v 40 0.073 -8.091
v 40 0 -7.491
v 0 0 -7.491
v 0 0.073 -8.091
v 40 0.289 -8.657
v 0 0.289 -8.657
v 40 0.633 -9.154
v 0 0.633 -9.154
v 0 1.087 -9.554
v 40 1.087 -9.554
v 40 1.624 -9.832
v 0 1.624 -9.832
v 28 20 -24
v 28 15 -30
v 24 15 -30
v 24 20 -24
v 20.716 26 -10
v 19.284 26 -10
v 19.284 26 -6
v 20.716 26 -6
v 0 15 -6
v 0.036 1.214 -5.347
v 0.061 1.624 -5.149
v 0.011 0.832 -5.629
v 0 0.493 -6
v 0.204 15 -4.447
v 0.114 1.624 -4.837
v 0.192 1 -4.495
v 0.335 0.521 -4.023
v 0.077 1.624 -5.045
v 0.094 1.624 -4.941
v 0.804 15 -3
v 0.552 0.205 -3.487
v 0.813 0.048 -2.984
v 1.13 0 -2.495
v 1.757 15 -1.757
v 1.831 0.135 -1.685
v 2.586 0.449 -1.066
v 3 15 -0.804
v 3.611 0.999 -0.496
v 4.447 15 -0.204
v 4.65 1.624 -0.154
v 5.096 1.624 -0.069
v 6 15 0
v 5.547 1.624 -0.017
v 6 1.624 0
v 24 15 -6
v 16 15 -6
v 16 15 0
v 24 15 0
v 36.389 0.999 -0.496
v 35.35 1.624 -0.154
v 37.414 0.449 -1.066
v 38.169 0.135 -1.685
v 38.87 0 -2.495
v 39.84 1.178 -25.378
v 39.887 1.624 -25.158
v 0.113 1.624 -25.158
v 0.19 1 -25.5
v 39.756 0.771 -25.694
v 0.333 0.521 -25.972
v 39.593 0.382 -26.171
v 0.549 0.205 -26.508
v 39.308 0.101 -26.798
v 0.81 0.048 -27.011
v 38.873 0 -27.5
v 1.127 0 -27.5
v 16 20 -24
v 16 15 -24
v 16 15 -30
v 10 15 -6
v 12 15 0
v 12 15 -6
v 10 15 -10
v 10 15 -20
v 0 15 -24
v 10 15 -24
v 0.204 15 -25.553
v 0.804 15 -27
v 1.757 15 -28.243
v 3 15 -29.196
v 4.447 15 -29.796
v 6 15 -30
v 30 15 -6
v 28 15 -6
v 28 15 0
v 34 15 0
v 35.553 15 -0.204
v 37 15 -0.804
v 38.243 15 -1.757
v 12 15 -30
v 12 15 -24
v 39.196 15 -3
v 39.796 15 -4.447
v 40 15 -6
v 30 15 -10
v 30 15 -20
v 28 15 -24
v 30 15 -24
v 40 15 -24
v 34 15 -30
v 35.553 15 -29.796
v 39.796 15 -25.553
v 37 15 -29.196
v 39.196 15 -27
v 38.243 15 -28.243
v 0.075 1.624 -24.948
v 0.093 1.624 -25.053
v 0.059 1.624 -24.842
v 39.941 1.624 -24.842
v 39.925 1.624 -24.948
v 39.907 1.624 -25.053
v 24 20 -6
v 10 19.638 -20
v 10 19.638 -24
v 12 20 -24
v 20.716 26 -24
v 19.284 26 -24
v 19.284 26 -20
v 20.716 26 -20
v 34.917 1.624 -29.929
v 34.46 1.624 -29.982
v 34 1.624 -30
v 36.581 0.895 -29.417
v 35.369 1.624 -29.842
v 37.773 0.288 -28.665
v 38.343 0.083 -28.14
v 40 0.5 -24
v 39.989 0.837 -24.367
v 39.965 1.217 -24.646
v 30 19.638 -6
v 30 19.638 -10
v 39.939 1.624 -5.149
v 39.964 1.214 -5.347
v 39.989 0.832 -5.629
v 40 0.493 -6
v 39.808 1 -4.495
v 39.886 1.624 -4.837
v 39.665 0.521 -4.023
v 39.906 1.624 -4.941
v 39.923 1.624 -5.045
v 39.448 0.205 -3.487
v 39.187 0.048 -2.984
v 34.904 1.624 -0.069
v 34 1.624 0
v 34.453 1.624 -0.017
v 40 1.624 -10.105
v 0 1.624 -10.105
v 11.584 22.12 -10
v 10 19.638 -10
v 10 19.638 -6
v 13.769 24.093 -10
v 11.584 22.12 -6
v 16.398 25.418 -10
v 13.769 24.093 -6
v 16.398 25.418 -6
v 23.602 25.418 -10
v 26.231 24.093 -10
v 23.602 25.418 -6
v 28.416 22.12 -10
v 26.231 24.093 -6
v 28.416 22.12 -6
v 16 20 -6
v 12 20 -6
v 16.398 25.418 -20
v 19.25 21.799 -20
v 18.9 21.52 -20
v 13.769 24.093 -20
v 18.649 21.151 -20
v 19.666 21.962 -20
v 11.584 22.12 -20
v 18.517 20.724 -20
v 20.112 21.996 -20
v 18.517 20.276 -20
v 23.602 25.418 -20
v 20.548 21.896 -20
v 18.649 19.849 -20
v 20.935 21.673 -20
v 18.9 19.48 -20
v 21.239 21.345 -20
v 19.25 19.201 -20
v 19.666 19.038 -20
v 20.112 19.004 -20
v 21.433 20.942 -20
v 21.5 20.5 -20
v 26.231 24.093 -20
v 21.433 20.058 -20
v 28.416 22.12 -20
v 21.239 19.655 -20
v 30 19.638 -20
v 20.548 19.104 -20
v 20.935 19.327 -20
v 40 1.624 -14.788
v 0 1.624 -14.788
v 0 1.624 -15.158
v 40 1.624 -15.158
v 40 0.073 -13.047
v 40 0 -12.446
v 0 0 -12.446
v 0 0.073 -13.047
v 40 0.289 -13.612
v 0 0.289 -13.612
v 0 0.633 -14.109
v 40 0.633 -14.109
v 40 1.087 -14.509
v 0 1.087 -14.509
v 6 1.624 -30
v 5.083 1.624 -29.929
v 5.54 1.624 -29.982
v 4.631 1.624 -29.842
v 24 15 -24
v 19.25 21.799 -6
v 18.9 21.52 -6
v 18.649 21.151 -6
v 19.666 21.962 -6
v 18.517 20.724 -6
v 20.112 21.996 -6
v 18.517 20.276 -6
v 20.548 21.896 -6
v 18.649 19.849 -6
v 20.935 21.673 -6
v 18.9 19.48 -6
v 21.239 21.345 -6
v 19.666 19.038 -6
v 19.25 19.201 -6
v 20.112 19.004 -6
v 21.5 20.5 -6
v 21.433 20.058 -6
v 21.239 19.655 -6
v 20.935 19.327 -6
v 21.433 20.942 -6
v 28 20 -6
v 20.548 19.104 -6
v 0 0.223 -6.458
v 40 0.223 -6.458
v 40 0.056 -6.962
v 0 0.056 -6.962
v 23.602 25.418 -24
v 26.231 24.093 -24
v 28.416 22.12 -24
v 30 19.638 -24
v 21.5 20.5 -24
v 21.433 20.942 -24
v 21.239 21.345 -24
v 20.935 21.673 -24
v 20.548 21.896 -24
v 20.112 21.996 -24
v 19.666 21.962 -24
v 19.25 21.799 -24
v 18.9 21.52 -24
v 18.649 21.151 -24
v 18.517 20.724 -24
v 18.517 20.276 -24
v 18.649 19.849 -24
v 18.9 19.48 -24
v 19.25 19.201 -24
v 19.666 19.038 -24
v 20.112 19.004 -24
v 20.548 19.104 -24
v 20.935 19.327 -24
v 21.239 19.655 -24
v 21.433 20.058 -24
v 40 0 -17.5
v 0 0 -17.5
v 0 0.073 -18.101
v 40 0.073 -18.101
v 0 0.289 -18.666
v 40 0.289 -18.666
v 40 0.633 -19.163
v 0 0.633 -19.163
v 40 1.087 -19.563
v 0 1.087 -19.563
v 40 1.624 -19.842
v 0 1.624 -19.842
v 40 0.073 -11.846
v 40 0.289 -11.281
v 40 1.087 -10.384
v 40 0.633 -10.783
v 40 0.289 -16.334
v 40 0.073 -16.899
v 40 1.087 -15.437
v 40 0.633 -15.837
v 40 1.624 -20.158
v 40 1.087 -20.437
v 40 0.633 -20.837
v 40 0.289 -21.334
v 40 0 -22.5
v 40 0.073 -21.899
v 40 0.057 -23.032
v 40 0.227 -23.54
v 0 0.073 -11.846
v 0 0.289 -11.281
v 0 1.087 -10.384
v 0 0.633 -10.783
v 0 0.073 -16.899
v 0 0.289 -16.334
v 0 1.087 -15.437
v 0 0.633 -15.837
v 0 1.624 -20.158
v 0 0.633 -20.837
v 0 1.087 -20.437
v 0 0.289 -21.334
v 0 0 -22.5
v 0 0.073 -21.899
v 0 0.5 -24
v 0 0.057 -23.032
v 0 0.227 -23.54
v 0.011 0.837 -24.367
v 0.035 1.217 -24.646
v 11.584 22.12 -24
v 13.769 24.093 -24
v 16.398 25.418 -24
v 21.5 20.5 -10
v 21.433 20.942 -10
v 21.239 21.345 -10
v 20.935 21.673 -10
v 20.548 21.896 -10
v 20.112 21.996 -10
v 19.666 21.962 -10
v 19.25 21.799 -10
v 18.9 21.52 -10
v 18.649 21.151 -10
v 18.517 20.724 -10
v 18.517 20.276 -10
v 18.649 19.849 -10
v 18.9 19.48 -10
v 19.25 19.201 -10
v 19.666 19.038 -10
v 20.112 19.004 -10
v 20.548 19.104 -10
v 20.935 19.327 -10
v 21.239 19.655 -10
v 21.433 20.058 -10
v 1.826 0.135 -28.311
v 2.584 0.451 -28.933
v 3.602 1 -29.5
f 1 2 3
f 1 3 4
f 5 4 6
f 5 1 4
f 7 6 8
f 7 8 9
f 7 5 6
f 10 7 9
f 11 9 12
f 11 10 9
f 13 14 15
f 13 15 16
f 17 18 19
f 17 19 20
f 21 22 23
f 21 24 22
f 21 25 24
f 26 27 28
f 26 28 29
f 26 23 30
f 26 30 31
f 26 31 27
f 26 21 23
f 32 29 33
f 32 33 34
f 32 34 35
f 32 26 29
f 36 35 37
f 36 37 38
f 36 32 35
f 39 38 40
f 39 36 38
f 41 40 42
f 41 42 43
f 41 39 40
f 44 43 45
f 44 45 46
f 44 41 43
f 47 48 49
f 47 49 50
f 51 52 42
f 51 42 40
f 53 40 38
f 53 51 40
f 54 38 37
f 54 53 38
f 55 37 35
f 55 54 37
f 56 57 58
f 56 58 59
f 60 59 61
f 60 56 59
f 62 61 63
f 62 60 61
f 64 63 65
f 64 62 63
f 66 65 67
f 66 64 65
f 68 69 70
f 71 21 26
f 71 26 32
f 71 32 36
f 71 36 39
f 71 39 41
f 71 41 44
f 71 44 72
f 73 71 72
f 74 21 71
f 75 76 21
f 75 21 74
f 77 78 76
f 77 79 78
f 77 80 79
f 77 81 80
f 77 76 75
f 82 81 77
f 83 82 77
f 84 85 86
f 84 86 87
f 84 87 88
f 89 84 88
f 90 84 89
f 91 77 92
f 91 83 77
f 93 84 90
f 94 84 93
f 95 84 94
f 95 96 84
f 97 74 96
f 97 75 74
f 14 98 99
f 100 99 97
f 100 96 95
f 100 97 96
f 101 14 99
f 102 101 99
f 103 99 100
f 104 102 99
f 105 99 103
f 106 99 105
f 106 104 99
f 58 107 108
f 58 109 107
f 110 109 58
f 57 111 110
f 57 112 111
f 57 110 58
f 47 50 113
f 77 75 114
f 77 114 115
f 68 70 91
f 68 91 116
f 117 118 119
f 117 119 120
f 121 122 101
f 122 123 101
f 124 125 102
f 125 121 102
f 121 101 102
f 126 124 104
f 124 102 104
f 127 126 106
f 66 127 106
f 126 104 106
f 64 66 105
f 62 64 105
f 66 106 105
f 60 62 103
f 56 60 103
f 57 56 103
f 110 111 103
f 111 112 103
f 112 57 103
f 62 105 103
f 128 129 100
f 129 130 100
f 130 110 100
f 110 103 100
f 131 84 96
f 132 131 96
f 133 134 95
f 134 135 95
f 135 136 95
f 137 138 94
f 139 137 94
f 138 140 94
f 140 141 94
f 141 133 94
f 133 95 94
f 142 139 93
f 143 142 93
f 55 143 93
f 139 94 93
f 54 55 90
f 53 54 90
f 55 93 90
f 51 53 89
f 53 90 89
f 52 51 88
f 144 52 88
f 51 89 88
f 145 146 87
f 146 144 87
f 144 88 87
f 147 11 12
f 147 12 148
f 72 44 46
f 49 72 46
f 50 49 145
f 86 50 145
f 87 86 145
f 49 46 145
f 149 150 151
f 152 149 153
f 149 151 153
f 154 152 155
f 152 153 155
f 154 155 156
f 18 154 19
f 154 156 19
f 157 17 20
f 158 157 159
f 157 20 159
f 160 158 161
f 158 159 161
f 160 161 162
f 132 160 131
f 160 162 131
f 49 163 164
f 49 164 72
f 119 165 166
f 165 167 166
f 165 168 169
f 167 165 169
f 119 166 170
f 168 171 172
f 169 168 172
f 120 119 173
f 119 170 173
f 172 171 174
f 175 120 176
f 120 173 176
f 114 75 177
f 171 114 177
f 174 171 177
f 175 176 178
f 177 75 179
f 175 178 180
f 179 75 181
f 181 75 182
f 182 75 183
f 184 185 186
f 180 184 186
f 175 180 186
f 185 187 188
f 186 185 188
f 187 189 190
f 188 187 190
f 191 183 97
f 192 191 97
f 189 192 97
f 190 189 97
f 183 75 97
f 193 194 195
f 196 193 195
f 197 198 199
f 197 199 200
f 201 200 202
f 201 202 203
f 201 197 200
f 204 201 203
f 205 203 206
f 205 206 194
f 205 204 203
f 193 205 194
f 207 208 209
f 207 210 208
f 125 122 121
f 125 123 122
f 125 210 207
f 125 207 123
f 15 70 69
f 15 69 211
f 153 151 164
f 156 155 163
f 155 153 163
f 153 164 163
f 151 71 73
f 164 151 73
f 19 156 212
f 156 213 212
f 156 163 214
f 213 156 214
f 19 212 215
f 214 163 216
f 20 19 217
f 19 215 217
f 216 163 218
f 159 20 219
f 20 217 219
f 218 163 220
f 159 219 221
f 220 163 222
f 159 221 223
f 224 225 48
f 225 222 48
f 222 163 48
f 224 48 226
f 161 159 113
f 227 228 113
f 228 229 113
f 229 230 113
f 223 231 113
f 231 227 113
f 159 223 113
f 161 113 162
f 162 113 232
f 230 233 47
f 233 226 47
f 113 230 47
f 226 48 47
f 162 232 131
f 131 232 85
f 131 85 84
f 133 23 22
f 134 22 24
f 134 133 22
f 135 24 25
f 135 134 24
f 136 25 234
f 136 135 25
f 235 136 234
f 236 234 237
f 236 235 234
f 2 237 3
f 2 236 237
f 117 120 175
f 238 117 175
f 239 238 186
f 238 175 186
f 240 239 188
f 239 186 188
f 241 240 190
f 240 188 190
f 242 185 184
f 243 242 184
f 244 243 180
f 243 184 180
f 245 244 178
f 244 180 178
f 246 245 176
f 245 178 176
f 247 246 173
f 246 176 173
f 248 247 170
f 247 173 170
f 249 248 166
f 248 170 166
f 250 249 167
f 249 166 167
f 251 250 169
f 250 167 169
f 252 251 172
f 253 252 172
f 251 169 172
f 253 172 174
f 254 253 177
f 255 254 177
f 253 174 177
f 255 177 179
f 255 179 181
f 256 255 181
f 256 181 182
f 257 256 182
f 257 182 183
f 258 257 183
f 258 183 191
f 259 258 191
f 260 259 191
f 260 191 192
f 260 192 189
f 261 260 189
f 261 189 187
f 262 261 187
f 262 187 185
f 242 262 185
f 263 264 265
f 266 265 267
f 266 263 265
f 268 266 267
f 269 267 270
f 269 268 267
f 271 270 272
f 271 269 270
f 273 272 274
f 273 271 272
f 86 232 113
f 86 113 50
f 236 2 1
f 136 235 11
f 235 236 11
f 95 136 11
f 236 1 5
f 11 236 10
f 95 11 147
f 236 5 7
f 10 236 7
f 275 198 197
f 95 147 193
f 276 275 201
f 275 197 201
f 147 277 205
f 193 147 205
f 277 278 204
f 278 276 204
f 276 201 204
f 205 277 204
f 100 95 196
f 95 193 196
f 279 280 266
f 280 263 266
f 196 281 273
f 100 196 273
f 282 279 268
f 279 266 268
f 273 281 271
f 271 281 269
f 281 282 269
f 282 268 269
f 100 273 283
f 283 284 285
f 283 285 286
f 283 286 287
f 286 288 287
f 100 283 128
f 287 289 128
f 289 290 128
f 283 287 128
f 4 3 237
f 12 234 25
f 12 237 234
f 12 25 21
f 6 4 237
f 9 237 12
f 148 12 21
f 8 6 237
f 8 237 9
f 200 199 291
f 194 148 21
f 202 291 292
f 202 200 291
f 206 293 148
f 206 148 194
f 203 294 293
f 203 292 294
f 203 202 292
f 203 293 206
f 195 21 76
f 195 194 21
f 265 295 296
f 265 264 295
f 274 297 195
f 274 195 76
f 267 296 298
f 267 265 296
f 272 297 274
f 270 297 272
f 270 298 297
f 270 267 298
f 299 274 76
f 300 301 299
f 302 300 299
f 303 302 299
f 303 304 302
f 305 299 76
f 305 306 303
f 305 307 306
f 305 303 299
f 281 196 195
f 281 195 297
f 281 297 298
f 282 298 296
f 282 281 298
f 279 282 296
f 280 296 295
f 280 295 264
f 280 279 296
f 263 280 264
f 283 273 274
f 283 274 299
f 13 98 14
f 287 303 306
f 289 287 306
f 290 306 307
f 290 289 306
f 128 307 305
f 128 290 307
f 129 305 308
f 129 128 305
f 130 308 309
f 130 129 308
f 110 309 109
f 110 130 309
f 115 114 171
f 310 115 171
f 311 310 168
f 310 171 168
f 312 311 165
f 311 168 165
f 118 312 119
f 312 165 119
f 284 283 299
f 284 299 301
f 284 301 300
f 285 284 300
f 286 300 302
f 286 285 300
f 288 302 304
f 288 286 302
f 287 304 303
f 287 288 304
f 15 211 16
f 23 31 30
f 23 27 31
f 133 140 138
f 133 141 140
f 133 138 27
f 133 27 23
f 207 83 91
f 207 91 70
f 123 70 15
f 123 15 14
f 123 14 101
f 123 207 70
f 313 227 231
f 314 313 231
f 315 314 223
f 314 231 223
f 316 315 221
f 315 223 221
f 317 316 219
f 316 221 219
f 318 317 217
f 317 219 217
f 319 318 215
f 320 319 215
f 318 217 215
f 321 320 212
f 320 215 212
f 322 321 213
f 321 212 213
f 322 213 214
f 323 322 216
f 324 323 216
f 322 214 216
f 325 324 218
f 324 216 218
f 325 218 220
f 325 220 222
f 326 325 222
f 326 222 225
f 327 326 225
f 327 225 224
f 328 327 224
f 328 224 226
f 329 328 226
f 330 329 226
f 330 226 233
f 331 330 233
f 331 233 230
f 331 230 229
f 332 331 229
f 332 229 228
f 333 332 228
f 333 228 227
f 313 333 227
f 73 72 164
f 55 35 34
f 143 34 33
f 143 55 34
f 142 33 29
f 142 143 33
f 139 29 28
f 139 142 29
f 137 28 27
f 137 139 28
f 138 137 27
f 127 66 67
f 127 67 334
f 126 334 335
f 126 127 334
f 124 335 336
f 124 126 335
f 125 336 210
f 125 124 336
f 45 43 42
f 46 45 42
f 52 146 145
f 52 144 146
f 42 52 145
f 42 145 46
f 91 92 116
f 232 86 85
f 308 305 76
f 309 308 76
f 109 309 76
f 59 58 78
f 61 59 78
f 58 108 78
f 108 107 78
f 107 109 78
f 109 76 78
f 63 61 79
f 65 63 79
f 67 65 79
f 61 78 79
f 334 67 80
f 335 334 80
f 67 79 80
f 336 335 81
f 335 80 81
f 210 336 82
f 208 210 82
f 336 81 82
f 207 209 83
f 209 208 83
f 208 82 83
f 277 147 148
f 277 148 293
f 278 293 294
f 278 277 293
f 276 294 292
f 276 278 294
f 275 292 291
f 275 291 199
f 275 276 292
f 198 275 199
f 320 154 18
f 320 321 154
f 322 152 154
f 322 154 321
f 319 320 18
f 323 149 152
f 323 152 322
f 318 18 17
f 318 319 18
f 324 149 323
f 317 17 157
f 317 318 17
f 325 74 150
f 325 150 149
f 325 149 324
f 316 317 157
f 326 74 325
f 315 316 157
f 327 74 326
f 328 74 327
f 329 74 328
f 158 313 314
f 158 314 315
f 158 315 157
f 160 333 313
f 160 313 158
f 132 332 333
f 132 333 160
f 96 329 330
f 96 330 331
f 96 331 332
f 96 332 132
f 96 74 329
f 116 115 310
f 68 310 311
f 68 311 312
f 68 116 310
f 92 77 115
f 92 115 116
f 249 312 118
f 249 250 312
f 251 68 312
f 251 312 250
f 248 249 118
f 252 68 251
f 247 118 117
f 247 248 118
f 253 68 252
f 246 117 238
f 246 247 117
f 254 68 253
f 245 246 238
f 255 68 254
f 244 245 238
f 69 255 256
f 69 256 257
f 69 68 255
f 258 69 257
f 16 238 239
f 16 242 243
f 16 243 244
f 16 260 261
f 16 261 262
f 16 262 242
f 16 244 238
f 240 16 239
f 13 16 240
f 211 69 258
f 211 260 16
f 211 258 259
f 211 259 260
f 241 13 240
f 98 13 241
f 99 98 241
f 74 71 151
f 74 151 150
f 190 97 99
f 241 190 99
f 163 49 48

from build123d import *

# Parameters (mm, degrees)
SKETCH1_W           = 40
SKETCH1_H           = 30
BOSS_EXTRUDE1_DEPTH = 15
SKETCH2_W           = 20
SKETCH2_H           = 4
BOSS_EXTRUDE2_DEPTH = 11
SKETCH3_R           = 1.5
CUT_EXTRUDE1_DEPTH  = 20
SKETCH4_W           = 4
SKETCH4_H           = 6
BOSS_EXTRUDE3_DEPTH = 5
CUT_EXTRUDE2_DEPTH  = 21
FILLET7_R           = 6
FILLET8_R           = 6
FILLET9_R           = 6
FILLET10_R          = 6
CUT_EXTRUDE5_DEPTH  = 44


with BuildPart() as part:
    # Sketch1 → Boss-Extrude1 (new body)
    with BuildSketch(Plane(origin=(0, 0, 0), x_dir=(1, 0, 0), z_dir=(0, 1, 0))):
        with Locations((20, 15)):
            Rectangle(SKETCH1_W, SKETCH1_H)
    extrude(amount=BOSS_EXTRUDE1_DEPTH)

    # Sketch2 → Boss-Extrude2 (add)
    with BuildSketch(Plane(origin=(0, 15, 0), x_dir=(1, 0, 0), z_dir=(0, 1, 0))):
        with Locations((20, 22)):
            Rectangle(SKETCH2_W, SKETCH2_H)
        with Locations((20, 8)):
            Rectangle(SKETCH2_W, SKETCH2_H)
    extrude(amount=BOSS_EXTRUDE2_DEPTH)

    # Sketch3 → Cut-Extrude1 (cut)
    with BuildSketch(Plane.XY.offset(-6)):
        with BuildLine():
            Line((30, 26), (20.715749816, 26))
            ThreePointArc((20.715749816, 26), (26.230983436, 24.093247122), (30, 19.638135164))
            Line((30, 19.638135164), (30, 26))
        make_face()
        with BuildLine():
            Line((10, 26), (10, 19.638135164))
            ThreePointArc((10, 19.638135164), (13.769016564, 24.093247122), (19.284250184, 26))
            Line((19.284250184, 26), (10, 26))
        make_face()
        with Locations((20, 20.5)):
            Circle(SKETCH3_R)
    extrude(amount=-CUT_EXTRUDE1_DEPTH, mode=Mode.SUBTRACT)

    # Sketch4 → Boss-Extrude3 (add)
    with BuildSketch(Plane(origin=(0, 15, 0), x_dir=(1, 0, 0), z_dir=(0, 1, 0))):
        with Locations((14, 27)):
            Rectangle(SKETCH4_W, SKETCH4_H)
        with Locations((26, 27)):
            Rectangle(SKETCH4_W, SKETCH4_H)
        with Locations((14, 3)):
            Rectangle(SKETCH4_W, SKETCH4_H)
        with Locations((26, 3)):
            Rectangle(SKETCH4_W, SKETCH4_H)
    extrude(amount=BOSS_EXTRUDE3_DEPTH)

    # Sketch5 → Cut-Extrude2 (cut)
    with BuildSketch(Plane(origin=(28, 0, 0), x_dir=(0, 0, -1), z_dir=(1, 0, 0))):
        Polygon((0, 15), (0, 20), (6, 20), align=None)
        Polygon((24, 20), (30, 20), (30, 15), align=None)
    extrude(amount=-CUT_EXTRUDE2_DEPTH, mode=Mode.SUBTRACT)

    # Fillet7
    fillet7_edges = [part.edges().sort_by_distance(p)[0] for p in [
        (0, 7.5, 0),
    ]]
    fillet(fillet7_edges, radius=FILLET7_R)

    # Fillet8
    fillet8_edges = [part.edges().sort_by_distance(p)[0] for p in [
        (0, 7.5, -30),
    ]]
    fillet(fillet8_edges, radius=FILLET8_R)

    # Fillet9
    fillet9_edges = [part.edges().sort_by_distance(p)[0] for p in [
        (40, 7.5, -30),
    ]]
    fillet(fillet9_edges, radius=FILLET9_R)

    # Fillet10
    fillet10_edges = [part.edges().sort_by_distance(p)[0] for p in [
        (40, 7.5, 0),
    ]]
    fillet(fillet10_edges, radius=FILLET10_R)

    # Sketch6 → Cut-Extrude5 (cut)
    with BuildSketch(Plane.ZY):
        with BuildLine():
            Line((-29.841633208, 1.624355142), (-30, 1.624355142))
            Line((-30, 1.624355142), (-30, 0))
            Line((-30, 0), (-27.5, 0))
            ThreePointArc((-27.5, 0), (-28.924936464, 0.445844195), (-29.841633208, 1.624355142))
        make_face()
        with BuildLine():
            Line((-24.841633208, 1.624355142), (-25.158366792, 1.624355142))
            ThreePointArc((-25.158366792, 1.624355142), (-26.075063536, 0.445844195), (-27.5, 0))
            Line((-27.5, 0), (-22.5, 0))
            ThreePointArc((-22.5, 0), (-23.924936464, 0.445844195), (-24.841633208, 1.624355142))
        make_face()
        with BuildLine():
            ThreePointArc((-20.158366792, 1.624355142), (-21.075063536, 0.445844195), (-22.5, 0))
            Line((-22.5, 0), (-17.5, 0))
            ThreePointArc((-17.5, 0), (-18.924936464, 0.445844195), (-19.841633208, 1.624355142))
            Line((-19.841633208, 1.624355142), (-20.158366792, 1.624355142))
        make_face()
        with BuildLine():
            ThreePointArc((-15.158366792, 1.624355142), (-16.075063536, 0.445844195), (-17.5, 0))
            Line((-17.5, 0), (-12.446445225, 0))
            ThreePointArc((-12.446445225, 0), (-13.871381684, 0.445844197), (-14.788078425, 1.624355142))
            Line((-14.788078425, 1.624355142), (-15.158366792, 1.624355142))
        make_face()
        with BuildLine():
            ThreePointArc((-10.104812008, 1.624355142), (-11.021508756, 0.445844192), (-12.446445225, 0))
            Line((-12.446445225, 0), (-7.490821501, 0))
            ThreePointArc((-7.490821501, 0), (-8.915757965, 0.445844195), (-9.832454709, 1.624355142))
            Line((-9.832454709, 1.624355142), (-10.104812008, 1.624355142))
        make_face()
        with BuildLine():
            Line((-7.490821501, 0), (-2.495393592, 0))
            ThreePointArc((-2.495393592, 0), (-3.920330048, 0.445844198), (-4.837026787, 1.624355142))
            Line((-4.837026787, 1.624355142), (-5.149188292, 1.624355142))
            ThreePointArc((-5.149188292, 1.624355142), (-6.065885036, 0.445844195), (-7.490821501, 0))
        make_face()
        with BuildLine():
            ThreePointArc((-0.15376037, 1.624355142), (-1.07045712, 0.445844191), (-2.495393592, 0))
            Line((-2.495393592, 0), (0, 0))
            Line((0, 0), (0, 1.624355142))
            Line((0, 1.624355142), (-0.15376037, 1.624355142))
        make_face()
    extrude(amount=-CUT_EXTRUDE5_DEPTH, mode=Mode.SUBTRACT)


solid = part.part
